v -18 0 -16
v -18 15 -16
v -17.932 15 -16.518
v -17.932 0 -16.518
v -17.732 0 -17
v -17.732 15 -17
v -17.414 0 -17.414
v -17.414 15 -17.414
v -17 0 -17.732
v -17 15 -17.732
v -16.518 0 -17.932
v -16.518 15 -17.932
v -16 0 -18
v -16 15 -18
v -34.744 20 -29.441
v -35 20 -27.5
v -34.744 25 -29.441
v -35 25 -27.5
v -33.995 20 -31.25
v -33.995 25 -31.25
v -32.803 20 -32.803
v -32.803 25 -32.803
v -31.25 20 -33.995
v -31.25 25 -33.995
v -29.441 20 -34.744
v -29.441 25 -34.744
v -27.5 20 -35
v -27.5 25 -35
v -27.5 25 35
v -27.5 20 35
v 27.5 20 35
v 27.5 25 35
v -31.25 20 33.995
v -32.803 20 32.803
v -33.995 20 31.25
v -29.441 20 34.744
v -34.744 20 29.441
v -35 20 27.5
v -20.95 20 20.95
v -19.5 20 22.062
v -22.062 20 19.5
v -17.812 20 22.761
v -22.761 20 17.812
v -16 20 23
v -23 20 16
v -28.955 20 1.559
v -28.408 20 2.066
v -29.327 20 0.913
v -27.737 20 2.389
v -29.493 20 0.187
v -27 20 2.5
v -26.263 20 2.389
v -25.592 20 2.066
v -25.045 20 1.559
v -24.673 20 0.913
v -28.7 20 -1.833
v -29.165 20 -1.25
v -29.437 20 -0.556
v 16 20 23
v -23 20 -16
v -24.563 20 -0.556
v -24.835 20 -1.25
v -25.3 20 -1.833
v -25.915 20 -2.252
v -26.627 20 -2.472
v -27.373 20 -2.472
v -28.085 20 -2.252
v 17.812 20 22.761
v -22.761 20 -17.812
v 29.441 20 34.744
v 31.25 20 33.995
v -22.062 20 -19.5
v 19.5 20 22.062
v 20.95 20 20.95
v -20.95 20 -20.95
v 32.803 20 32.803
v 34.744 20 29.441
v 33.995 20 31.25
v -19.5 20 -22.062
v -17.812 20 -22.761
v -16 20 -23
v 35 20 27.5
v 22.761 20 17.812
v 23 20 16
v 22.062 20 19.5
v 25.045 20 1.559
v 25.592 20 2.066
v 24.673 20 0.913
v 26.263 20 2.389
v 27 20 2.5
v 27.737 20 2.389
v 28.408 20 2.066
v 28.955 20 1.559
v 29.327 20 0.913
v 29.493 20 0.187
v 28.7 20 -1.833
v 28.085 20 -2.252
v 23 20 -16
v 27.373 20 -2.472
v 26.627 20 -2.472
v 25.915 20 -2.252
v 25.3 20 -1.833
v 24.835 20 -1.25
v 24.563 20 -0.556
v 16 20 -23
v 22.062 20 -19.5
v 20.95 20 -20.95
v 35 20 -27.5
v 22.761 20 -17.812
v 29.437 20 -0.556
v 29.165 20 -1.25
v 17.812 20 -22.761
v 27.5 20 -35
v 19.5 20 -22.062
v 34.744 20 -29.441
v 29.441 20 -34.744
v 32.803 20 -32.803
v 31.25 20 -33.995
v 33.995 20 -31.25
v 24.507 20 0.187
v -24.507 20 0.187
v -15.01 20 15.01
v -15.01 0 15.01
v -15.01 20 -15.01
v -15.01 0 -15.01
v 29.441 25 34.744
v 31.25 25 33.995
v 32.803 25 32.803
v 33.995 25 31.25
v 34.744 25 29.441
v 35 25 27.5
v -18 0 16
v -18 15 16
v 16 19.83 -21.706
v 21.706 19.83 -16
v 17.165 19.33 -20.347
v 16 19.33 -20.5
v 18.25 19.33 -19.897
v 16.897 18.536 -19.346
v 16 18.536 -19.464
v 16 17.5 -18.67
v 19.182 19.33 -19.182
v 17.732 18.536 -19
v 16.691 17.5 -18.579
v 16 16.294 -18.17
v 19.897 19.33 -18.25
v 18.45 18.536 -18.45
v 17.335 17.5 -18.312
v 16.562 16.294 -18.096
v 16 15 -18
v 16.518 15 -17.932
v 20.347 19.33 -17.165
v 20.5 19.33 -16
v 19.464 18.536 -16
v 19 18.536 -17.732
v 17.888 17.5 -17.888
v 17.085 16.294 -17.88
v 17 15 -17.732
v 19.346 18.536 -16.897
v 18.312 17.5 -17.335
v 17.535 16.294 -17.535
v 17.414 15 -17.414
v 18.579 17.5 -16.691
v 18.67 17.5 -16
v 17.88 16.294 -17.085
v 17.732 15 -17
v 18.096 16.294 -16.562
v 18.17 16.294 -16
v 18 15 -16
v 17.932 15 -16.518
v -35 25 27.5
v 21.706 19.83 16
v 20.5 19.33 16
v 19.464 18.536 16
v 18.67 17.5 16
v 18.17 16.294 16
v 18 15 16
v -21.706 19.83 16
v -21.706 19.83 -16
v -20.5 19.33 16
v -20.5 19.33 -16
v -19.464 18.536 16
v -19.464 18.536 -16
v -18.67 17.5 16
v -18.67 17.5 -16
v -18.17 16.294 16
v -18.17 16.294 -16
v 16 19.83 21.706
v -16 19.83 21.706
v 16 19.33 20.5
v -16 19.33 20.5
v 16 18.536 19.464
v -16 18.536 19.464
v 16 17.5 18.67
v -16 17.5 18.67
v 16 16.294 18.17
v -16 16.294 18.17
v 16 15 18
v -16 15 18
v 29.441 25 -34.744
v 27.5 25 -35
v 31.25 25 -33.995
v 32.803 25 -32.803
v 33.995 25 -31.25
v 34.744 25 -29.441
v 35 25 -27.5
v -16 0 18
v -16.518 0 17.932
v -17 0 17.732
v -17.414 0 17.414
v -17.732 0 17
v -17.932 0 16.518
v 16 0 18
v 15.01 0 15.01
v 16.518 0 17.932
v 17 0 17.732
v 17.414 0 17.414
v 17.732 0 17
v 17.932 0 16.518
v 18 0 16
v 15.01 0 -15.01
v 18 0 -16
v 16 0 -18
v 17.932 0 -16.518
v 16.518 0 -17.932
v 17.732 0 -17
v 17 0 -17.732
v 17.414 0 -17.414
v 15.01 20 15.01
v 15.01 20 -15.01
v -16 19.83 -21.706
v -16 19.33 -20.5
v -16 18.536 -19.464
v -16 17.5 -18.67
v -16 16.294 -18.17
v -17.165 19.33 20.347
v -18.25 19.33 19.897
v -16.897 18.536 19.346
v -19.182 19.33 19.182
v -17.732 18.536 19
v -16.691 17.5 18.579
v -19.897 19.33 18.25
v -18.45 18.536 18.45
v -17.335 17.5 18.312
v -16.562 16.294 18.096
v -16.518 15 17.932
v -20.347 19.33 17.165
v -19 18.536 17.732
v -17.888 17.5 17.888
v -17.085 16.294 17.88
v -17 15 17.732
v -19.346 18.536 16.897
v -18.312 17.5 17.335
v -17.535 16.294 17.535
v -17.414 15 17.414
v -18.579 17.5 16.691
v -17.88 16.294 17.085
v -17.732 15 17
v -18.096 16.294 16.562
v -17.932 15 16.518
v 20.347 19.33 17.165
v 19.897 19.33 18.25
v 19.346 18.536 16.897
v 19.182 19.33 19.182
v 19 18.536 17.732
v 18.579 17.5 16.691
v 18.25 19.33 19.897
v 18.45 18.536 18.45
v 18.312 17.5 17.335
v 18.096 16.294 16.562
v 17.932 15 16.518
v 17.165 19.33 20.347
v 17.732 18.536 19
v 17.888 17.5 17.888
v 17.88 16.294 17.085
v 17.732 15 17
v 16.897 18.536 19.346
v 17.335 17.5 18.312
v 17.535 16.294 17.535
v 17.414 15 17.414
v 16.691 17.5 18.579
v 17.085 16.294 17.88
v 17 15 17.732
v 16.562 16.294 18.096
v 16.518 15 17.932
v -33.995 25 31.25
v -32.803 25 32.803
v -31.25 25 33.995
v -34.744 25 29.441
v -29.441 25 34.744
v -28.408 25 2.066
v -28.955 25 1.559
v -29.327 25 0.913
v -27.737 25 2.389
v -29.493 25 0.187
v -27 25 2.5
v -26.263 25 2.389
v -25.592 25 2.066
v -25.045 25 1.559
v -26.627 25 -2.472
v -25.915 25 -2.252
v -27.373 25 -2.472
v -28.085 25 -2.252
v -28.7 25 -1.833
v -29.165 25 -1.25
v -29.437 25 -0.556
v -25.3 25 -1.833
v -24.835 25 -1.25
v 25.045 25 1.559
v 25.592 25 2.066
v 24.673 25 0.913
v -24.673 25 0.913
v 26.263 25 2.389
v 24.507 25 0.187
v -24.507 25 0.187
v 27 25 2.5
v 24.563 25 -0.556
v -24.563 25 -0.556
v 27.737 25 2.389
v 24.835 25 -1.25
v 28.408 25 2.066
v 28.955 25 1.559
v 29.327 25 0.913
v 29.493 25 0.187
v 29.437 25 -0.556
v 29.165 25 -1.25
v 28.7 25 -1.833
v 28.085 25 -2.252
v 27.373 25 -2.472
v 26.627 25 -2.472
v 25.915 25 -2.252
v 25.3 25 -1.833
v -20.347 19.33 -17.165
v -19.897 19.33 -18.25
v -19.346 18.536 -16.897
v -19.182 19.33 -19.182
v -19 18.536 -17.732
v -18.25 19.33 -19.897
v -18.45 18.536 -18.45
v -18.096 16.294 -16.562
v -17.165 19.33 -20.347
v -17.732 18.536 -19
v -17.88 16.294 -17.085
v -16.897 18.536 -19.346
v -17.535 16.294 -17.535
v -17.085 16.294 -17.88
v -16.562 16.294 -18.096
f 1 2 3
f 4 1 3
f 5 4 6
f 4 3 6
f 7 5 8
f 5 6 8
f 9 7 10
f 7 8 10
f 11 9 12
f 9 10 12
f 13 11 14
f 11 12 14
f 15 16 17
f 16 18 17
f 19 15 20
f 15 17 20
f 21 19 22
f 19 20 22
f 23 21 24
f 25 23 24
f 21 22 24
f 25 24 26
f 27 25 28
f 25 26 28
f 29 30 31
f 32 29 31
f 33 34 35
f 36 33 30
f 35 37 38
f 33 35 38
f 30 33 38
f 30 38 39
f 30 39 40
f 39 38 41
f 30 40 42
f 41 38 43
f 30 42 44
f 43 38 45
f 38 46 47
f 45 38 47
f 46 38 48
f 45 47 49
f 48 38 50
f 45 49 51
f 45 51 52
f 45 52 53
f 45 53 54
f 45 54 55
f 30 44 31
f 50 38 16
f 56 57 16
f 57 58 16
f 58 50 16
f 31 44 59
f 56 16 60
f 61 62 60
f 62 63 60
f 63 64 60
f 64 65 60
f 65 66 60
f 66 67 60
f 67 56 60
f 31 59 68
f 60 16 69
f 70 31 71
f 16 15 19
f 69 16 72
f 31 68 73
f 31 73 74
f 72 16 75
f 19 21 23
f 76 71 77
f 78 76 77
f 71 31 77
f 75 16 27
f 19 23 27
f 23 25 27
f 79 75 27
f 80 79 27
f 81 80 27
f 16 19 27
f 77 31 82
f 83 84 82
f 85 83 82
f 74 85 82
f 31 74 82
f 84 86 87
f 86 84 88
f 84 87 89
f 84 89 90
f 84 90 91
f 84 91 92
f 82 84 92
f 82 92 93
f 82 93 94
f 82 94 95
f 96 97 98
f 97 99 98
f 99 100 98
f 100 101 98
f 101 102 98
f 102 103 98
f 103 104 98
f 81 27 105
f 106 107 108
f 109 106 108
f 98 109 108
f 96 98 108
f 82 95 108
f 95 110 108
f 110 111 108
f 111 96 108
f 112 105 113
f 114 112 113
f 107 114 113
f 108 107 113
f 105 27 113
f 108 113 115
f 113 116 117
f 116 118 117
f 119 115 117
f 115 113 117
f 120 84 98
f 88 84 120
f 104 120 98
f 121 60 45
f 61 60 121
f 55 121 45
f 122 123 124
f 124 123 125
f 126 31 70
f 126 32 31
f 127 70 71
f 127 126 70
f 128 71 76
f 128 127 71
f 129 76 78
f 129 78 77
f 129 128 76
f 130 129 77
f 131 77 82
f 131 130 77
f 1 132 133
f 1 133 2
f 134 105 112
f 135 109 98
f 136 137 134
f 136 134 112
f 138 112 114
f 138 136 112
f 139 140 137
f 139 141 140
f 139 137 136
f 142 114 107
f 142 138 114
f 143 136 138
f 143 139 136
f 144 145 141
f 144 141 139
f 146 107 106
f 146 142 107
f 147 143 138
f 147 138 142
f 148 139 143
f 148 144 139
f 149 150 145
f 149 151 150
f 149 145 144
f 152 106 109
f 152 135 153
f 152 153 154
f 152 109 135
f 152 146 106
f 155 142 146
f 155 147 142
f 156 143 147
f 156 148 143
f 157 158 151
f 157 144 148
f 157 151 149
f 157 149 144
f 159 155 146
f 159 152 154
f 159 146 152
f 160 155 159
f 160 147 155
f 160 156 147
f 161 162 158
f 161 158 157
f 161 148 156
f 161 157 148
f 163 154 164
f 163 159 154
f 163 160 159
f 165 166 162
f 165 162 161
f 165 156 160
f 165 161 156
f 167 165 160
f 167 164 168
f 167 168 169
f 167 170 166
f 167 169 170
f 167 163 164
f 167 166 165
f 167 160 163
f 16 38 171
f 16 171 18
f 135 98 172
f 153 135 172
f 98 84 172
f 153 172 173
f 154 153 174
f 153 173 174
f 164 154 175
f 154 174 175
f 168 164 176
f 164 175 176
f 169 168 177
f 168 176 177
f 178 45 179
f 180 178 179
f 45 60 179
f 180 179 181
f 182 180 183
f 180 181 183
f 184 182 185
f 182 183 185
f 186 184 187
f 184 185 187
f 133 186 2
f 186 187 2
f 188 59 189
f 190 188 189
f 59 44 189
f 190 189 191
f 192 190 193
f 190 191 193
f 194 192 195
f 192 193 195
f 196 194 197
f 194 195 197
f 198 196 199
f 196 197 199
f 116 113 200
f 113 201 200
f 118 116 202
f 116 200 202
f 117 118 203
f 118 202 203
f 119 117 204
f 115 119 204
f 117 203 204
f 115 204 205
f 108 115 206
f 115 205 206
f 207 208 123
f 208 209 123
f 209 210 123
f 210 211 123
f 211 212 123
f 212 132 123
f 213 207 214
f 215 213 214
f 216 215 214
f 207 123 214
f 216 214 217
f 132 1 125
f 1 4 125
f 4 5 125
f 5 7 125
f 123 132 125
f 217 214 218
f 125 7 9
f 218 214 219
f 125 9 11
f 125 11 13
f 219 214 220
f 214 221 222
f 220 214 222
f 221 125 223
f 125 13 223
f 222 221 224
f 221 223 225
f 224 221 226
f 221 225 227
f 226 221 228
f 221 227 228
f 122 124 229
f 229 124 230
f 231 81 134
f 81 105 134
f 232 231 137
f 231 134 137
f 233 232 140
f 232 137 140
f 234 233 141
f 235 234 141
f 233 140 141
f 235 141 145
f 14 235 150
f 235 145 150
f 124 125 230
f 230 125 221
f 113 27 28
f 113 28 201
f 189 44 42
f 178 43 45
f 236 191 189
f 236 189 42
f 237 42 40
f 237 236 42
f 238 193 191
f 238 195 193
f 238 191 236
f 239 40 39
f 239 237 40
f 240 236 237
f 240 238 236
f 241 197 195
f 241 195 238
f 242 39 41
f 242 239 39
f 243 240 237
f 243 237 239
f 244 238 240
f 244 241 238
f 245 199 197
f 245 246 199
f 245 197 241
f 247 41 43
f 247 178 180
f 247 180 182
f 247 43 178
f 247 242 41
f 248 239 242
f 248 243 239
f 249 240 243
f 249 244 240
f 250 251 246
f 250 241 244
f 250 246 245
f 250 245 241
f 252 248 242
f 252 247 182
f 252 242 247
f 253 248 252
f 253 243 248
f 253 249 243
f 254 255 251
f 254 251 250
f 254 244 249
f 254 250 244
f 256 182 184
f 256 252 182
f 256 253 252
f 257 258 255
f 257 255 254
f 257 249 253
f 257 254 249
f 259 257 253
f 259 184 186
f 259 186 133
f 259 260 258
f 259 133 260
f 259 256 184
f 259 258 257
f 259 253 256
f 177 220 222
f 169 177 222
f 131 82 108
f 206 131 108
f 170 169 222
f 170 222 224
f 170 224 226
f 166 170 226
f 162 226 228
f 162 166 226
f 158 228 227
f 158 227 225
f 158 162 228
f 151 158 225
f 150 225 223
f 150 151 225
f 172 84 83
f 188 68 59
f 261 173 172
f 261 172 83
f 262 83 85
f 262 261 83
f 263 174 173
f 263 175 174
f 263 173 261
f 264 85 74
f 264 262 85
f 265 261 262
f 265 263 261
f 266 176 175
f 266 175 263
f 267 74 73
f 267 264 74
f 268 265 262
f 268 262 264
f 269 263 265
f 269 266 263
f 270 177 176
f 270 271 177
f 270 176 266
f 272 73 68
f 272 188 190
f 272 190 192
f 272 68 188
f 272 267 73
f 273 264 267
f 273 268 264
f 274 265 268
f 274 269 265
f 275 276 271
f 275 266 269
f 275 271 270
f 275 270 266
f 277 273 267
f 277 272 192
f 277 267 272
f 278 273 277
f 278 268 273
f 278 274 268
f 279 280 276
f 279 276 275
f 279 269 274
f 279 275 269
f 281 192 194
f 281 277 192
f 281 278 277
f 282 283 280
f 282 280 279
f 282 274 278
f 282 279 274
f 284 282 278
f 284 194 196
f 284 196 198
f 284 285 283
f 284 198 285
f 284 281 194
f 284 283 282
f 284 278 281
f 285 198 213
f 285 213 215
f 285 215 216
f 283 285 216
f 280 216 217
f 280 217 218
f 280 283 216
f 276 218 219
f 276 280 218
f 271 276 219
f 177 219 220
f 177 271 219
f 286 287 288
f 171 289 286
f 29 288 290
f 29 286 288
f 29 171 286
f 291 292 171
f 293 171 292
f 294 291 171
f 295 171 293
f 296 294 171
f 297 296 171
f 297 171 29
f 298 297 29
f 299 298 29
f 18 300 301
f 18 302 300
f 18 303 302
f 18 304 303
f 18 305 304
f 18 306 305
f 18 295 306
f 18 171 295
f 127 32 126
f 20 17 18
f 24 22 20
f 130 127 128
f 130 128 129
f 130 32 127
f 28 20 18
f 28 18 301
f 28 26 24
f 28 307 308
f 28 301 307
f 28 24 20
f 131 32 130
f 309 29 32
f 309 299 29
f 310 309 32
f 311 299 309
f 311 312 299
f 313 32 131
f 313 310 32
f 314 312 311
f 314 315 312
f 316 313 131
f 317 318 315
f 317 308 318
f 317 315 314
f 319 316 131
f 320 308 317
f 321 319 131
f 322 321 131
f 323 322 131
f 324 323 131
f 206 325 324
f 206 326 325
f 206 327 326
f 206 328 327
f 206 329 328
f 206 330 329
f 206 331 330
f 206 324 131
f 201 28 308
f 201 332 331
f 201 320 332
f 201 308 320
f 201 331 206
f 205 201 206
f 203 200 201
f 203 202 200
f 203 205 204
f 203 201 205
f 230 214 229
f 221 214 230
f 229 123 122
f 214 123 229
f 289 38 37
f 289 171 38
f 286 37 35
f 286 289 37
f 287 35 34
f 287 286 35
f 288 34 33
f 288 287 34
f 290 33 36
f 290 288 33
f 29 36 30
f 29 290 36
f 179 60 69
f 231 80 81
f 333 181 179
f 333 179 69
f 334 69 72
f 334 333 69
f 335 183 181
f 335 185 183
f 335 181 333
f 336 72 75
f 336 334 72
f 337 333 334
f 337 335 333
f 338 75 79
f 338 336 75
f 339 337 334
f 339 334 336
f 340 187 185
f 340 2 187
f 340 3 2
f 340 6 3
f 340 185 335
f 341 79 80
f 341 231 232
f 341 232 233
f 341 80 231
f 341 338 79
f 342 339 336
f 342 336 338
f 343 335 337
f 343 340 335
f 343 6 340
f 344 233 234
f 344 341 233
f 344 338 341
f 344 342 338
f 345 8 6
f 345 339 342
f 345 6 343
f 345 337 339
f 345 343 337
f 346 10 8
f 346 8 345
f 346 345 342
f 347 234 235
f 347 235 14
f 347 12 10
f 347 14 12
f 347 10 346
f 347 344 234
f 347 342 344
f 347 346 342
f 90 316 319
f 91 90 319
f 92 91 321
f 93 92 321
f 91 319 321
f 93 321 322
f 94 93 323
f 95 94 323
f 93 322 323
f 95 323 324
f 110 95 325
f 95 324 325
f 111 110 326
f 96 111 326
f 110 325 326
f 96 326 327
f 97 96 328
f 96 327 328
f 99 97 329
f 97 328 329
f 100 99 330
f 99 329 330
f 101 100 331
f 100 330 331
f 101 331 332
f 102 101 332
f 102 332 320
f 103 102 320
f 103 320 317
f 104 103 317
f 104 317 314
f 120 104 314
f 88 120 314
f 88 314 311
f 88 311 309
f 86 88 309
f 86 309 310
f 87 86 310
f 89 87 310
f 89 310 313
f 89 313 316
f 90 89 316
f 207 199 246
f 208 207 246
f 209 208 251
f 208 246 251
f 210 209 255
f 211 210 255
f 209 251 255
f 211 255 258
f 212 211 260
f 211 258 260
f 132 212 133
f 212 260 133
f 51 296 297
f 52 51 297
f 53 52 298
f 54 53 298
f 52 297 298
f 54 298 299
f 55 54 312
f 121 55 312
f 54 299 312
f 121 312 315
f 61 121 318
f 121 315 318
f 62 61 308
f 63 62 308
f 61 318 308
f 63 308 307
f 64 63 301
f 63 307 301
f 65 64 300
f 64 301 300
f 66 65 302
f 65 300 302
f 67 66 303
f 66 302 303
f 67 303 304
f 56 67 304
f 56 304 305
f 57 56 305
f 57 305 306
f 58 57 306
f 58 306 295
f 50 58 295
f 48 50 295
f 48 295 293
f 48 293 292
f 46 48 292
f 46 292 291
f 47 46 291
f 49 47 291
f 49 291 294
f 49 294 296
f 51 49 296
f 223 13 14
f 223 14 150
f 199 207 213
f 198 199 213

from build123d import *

# Parameters (mm, degrees)
SKETCH1_W           = 36
SKETCH1_H           = 36
SKETCH1_W_2         = 30.02
SKETCH1_H_2         = 30.02
BOSS_EXTRUDE1_DEPTH = 20
SKETCH2_W           = 70
SKETCH2_H           = 70
BOSS_EXTRUDE2_DEPTH = 5
FILLET1_R           = 7.5
SKETCH3_R           = 2.5
CUT_EXTRUDE1_DEPTH  = 56.452682532
FILLET2_R           = 2
FILLET3_R           = 5


with BuildPart() as part:
    # Sketch1 → Boss-Extrude1 (new body)
    with BuildSketch(Plane(origin=(0, 0, 0), x_dir=(1, 0, 0), z_dir=(0, 1, 0))):
        Rectangle(SKETCH1_W, SKETCH1_H)
        Rectangle(SKETCH1_W_2, SKETCH1_H_2, mode=Mode.SUBTRACT)
    extrude(amount=BOSS_EXTRUDE1_DEPTH)

    # Sketch2 → Boss-Extrude2 (add)
    with BuildSketch(Plane(origin=(0, 20, 0), x_dir=(1, 0, 0), z_dir=(0, 1, 0))):
        Rectangle(SKETCH2_W, SKETCH2_H)
    extrude(amount=BOSS_EXTRUDE2_DEPTH)

    # Fillet1
    fillet1_edges = [part.edges().sort_by_distance(p)[0] for p in [
        (35, 22.5, 35),
        (35, 22.5, -35),
        (-35, 22.5, -35),
        (-35, 22.5, 35),
    ]]
    fillet(fillet1_edges, radius=FILLET1_R)

    # Sketch3 → Cut-Extrude1 (cut, through all)
    with BuildSketch(Plane(origin=(0, 25, 0), x_dir=(1, 0, 0), z_dir=(0, 1, 0))):
        with Locations(Location((-27, 0, 0), (0, 0, 270))):
            Circle(SKETCH3_R)
        with Locations(Location((27, 0, 0), (0, 0, 270))):
            Circle(SKETCH3_R)
    extrude(amount=-CUT_EXTRUDE1_DEPTH, mode=Mode.SUBTRACT)

    # Fillet2
    fillet2_edges = [part.edges().sort_by_distance(p)[0] for p in [
        (18, 10, 18),
        (-18, 10, 18),
        (-18, 10, -18),
        (18, 10, -18),
    ]]
    fillet(fillet2_edges, radius=FILLET2_R)

    # Fillet3
    fillet3_edges = [part.edges().sort_by_distance(p)[0] for p in [
        (0, 20, -18),
        (18, 20, 0),
        (0, 20, 18),
        (-18, 20, 0),
        (17.414213562, 20, -17.414213562),
        (17.414213562, 20, 17.414213562),
        (-17.414213562, 20, -17.414213562),
        (-17.414213562, 20, 17.414213562),
    ]]
    fillet(fillet3_edges, radius=FILLET3_R)


solid = part.part
